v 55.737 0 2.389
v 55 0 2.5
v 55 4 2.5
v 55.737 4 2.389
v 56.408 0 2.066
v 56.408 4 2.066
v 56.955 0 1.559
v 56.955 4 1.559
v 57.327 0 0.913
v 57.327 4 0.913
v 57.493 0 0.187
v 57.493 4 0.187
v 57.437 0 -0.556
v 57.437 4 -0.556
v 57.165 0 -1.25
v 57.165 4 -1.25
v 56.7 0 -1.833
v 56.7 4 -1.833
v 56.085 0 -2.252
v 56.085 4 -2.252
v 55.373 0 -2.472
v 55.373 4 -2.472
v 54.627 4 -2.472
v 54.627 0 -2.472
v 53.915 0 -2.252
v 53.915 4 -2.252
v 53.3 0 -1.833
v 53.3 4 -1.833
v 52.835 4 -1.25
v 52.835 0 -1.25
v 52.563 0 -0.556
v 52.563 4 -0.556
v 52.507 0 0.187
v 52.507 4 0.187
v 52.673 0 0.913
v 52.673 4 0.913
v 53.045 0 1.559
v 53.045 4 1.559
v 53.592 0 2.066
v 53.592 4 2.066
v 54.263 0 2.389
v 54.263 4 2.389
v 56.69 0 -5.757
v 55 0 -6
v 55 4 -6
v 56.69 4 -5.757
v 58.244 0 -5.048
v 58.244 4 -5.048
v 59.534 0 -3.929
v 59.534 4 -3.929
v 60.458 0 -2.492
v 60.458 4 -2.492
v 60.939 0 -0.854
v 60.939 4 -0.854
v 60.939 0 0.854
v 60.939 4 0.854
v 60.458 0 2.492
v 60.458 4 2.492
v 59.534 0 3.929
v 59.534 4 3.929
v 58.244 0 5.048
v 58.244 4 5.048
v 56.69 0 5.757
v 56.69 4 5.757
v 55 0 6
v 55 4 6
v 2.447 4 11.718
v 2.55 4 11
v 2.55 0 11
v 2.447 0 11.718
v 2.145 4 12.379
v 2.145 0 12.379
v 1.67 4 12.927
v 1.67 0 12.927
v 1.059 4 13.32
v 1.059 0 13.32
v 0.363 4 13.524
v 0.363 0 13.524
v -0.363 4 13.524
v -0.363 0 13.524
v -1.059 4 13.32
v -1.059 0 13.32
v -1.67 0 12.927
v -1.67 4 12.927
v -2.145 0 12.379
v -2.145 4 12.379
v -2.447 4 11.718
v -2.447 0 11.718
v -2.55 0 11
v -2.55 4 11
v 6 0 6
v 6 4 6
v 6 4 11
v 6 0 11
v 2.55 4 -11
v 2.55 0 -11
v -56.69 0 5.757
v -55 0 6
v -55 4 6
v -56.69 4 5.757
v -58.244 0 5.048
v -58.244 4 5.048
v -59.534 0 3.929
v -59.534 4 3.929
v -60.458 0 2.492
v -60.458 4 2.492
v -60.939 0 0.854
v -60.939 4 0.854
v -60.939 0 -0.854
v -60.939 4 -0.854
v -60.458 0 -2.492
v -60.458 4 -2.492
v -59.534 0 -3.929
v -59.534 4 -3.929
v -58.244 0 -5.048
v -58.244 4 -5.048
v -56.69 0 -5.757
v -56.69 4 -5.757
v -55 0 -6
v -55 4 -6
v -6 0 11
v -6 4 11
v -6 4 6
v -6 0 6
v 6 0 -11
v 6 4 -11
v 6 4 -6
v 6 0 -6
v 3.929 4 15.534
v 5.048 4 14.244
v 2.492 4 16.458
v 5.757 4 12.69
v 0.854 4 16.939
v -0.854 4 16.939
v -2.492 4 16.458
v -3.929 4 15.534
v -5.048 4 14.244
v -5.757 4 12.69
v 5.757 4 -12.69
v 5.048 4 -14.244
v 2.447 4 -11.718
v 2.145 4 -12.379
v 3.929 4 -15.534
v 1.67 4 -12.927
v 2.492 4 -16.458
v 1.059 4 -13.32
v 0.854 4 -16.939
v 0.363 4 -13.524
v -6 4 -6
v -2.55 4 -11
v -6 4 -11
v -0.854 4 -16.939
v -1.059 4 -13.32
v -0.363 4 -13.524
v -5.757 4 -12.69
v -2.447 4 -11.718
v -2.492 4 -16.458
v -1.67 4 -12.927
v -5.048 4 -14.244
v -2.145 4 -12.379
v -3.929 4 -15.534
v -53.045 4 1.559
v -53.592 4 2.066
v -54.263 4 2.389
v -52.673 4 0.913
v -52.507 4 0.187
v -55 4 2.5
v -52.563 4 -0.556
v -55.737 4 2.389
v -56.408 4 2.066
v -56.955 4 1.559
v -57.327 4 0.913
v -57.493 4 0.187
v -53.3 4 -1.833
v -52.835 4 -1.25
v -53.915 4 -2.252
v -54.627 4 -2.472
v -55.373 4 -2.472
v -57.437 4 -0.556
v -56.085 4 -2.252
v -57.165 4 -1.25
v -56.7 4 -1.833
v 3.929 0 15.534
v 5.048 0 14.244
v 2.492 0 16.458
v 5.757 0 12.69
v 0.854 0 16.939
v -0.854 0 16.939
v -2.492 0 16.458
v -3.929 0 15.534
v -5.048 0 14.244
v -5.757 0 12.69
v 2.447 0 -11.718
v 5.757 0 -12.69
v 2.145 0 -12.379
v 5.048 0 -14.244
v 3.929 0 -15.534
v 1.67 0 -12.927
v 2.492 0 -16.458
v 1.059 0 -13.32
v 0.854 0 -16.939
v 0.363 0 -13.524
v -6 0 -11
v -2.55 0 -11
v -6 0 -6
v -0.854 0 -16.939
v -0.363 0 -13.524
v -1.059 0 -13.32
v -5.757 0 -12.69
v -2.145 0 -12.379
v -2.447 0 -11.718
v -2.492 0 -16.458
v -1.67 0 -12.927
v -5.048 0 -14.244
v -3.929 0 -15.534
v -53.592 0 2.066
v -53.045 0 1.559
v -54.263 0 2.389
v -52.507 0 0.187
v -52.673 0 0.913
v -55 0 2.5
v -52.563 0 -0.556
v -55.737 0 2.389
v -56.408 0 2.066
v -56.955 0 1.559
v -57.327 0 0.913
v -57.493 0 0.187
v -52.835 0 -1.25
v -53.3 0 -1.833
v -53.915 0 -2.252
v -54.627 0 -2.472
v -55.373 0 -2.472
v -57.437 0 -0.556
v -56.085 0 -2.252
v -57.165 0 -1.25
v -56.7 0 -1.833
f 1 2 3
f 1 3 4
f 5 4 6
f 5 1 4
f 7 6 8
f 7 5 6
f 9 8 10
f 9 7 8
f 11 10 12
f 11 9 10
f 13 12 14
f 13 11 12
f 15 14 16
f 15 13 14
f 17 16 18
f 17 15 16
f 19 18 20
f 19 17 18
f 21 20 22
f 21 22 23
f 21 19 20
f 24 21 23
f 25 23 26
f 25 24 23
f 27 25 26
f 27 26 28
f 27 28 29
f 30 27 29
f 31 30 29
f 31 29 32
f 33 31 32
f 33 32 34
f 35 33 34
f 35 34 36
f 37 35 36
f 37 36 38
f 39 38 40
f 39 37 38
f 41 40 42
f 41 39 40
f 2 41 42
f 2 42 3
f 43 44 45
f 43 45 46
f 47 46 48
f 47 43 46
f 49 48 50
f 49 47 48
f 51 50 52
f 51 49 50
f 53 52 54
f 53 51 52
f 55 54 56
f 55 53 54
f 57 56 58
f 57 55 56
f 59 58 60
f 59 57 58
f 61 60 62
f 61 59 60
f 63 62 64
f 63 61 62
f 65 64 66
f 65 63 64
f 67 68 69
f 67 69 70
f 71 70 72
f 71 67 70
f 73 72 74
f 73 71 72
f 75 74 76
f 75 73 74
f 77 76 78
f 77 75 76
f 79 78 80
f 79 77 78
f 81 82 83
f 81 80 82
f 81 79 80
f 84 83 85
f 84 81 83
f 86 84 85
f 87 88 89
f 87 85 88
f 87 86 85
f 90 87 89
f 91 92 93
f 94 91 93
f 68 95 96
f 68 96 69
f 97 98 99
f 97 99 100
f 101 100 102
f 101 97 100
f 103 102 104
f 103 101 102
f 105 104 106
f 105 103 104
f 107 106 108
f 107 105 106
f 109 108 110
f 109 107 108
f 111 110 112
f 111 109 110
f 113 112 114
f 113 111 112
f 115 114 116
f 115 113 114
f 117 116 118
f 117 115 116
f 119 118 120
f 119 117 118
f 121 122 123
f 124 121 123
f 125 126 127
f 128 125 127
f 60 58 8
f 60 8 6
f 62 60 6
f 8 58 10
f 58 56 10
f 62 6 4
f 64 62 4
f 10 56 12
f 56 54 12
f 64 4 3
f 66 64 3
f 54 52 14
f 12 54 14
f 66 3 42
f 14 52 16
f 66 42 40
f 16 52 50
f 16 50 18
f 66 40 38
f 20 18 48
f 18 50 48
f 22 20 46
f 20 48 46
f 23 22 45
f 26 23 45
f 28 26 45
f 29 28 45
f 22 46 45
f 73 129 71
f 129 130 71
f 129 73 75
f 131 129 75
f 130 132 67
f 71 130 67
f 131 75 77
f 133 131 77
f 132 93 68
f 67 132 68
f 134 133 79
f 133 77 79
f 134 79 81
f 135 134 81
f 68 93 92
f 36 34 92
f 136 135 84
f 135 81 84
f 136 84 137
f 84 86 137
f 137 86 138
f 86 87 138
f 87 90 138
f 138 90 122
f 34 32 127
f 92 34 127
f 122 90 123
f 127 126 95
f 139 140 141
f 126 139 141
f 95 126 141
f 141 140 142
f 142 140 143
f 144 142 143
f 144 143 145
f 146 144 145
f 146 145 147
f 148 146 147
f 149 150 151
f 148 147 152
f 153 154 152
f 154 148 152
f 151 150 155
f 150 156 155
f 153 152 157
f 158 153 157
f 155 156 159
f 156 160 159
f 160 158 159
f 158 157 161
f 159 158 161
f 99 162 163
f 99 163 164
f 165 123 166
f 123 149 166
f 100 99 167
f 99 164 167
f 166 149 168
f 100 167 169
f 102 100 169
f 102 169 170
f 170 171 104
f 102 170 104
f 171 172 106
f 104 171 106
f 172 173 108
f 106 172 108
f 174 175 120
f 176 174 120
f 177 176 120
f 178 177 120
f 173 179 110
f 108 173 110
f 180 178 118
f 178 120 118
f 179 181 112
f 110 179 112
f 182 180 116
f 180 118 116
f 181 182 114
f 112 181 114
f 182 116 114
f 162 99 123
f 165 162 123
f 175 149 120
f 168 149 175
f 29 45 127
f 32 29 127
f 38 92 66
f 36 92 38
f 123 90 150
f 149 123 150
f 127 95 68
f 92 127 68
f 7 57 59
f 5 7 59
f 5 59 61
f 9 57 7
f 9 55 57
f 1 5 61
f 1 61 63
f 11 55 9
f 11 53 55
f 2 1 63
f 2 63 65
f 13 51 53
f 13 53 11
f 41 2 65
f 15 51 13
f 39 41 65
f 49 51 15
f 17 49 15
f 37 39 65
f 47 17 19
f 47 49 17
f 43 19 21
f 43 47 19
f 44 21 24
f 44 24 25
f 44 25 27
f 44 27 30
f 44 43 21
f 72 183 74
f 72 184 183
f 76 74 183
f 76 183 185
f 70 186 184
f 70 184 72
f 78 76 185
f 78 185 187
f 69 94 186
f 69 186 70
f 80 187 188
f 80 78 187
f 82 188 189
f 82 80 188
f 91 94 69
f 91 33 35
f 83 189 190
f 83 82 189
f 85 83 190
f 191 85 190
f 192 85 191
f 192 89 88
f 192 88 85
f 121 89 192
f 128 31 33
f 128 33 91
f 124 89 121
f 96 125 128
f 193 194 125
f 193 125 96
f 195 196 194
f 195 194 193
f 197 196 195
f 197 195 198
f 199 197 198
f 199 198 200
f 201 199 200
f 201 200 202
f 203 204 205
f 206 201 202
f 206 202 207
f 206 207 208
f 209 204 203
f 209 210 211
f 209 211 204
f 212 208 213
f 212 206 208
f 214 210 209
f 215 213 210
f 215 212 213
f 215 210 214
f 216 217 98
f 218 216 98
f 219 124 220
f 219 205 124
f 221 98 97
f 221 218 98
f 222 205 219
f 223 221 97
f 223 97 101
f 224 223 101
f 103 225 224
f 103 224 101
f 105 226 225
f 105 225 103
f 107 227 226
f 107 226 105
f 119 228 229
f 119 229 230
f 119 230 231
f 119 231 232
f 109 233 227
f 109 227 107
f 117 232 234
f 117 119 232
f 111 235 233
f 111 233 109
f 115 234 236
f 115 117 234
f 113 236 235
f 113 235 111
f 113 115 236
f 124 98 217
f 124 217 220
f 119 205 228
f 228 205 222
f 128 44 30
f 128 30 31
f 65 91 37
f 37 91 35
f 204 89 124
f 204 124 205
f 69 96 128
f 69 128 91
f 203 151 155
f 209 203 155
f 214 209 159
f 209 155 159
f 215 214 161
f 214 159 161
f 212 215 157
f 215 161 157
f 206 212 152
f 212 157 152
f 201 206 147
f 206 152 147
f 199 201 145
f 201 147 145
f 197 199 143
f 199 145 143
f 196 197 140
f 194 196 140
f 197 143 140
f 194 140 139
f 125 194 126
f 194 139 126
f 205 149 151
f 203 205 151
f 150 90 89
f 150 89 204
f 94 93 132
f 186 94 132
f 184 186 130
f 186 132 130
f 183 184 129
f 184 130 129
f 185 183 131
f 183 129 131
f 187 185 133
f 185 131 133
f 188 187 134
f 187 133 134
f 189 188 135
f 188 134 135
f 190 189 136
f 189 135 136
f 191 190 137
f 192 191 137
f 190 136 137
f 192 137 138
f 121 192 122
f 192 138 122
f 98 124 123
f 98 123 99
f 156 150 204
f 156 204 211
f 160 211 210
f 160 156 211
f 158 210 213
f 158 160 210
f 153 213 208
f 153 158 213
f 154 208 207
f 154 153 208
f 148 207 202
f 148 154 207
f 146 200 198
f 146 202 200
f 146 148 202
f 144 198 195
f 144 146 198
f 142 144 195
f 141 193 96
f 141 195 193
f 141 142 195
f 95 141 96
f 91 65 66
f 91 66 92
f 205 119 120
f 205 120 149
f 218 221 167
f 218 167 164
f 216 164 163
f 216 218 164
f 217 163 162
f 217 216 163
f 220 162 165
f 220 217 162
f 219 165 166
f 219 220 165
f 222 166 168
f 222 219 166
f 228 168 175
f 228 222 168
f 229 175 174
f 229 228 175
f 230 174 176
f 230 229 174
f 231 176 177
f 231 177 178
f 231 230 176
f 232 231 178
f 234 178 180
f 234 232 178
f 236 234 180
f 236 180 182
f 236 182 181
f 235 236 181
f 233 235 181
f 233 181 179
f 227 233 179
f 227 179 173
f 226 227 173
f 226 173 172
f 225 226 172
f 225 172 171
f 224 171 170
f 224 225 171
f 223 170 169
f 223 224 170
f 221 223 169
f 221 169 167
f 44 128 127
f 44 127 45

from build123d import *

# Parameters (mm, degrees)
SKETCH_1_R          = 2.5
EXTRUDE_1_DEPTH     = 4
EXTRUDE_2_DEPTH     = 4
CUT_EXTRUDE_1_DEPTH = 5


with BuildPart() as part:
    # 草图1 → 凸台-拉伸1 (new body)
    with BuildSketch(Plane(origin=(0, 0, 0), x_dir=(1, 0, 0), z_dir=(0, 1, 0))):
        with BuildLine():
            Line((-55, 6), (55, 6))
            ThreePointArc((55, 6), (61, 0), (55, -6))
            Line((55, -6), (-55, -6))
            ThreePointArc((-55, -6), (-61, 0), (-55, 6))
        make_face()
        with Locations(Location((55, 0, 0), (0, 0, 270))):
            Circle(SKETCH_1_R, mode=Mode.SUBTRACT)
        with Locations(Location((-55, 0, 0), (0, 0, 270))):
            Circle(SKETCH_1_R, mode=Mode.SUBTRACT)
    extrude(amount=EXTRUDE_1_DEPTH)

    # 草图2 → 凸台-拉伸2 (add)
    with BuildSketch(Plane(origin=(0, 4, 0), x_dir=(1, 0, 0), z_dir=(0, 1, 0))):
        with BuildLine():
            Line((-6, -11), (-6, 11))
            ThreePointArc((-6, 11), (0, 17), (6, 11))
            Line((6, 11), (6, -11))
            ThreePointArc((6, -11), (0, -17), (-6, -11))
        make_face()
    extrude(amount=-EXTRUDE_2_DEPTH)

    # 草图3 → 切除-拉伸1 (cut)
    with BuildSketch(Plane(origin=(0, 4, 0), x_dir=(1, 0, 0), z_dir=(0, 1, 0))):
        with BuildLine():
            Line((-2.55, -11), (-2.55, 11))
            ThreePointArc((-2.55, 11), (0, 13.55), (2.55, 11))
            Line((2.55, 11), (2.55, -11))
            ThreePointArc((2.55, -11), (0, -13.55), (-2.55, -11))
        make_face()
    extrude(amount=-CUT_EXTRUDE_1_DEPTH, mode=Mode.SUBTRACT)


solid = part.part
